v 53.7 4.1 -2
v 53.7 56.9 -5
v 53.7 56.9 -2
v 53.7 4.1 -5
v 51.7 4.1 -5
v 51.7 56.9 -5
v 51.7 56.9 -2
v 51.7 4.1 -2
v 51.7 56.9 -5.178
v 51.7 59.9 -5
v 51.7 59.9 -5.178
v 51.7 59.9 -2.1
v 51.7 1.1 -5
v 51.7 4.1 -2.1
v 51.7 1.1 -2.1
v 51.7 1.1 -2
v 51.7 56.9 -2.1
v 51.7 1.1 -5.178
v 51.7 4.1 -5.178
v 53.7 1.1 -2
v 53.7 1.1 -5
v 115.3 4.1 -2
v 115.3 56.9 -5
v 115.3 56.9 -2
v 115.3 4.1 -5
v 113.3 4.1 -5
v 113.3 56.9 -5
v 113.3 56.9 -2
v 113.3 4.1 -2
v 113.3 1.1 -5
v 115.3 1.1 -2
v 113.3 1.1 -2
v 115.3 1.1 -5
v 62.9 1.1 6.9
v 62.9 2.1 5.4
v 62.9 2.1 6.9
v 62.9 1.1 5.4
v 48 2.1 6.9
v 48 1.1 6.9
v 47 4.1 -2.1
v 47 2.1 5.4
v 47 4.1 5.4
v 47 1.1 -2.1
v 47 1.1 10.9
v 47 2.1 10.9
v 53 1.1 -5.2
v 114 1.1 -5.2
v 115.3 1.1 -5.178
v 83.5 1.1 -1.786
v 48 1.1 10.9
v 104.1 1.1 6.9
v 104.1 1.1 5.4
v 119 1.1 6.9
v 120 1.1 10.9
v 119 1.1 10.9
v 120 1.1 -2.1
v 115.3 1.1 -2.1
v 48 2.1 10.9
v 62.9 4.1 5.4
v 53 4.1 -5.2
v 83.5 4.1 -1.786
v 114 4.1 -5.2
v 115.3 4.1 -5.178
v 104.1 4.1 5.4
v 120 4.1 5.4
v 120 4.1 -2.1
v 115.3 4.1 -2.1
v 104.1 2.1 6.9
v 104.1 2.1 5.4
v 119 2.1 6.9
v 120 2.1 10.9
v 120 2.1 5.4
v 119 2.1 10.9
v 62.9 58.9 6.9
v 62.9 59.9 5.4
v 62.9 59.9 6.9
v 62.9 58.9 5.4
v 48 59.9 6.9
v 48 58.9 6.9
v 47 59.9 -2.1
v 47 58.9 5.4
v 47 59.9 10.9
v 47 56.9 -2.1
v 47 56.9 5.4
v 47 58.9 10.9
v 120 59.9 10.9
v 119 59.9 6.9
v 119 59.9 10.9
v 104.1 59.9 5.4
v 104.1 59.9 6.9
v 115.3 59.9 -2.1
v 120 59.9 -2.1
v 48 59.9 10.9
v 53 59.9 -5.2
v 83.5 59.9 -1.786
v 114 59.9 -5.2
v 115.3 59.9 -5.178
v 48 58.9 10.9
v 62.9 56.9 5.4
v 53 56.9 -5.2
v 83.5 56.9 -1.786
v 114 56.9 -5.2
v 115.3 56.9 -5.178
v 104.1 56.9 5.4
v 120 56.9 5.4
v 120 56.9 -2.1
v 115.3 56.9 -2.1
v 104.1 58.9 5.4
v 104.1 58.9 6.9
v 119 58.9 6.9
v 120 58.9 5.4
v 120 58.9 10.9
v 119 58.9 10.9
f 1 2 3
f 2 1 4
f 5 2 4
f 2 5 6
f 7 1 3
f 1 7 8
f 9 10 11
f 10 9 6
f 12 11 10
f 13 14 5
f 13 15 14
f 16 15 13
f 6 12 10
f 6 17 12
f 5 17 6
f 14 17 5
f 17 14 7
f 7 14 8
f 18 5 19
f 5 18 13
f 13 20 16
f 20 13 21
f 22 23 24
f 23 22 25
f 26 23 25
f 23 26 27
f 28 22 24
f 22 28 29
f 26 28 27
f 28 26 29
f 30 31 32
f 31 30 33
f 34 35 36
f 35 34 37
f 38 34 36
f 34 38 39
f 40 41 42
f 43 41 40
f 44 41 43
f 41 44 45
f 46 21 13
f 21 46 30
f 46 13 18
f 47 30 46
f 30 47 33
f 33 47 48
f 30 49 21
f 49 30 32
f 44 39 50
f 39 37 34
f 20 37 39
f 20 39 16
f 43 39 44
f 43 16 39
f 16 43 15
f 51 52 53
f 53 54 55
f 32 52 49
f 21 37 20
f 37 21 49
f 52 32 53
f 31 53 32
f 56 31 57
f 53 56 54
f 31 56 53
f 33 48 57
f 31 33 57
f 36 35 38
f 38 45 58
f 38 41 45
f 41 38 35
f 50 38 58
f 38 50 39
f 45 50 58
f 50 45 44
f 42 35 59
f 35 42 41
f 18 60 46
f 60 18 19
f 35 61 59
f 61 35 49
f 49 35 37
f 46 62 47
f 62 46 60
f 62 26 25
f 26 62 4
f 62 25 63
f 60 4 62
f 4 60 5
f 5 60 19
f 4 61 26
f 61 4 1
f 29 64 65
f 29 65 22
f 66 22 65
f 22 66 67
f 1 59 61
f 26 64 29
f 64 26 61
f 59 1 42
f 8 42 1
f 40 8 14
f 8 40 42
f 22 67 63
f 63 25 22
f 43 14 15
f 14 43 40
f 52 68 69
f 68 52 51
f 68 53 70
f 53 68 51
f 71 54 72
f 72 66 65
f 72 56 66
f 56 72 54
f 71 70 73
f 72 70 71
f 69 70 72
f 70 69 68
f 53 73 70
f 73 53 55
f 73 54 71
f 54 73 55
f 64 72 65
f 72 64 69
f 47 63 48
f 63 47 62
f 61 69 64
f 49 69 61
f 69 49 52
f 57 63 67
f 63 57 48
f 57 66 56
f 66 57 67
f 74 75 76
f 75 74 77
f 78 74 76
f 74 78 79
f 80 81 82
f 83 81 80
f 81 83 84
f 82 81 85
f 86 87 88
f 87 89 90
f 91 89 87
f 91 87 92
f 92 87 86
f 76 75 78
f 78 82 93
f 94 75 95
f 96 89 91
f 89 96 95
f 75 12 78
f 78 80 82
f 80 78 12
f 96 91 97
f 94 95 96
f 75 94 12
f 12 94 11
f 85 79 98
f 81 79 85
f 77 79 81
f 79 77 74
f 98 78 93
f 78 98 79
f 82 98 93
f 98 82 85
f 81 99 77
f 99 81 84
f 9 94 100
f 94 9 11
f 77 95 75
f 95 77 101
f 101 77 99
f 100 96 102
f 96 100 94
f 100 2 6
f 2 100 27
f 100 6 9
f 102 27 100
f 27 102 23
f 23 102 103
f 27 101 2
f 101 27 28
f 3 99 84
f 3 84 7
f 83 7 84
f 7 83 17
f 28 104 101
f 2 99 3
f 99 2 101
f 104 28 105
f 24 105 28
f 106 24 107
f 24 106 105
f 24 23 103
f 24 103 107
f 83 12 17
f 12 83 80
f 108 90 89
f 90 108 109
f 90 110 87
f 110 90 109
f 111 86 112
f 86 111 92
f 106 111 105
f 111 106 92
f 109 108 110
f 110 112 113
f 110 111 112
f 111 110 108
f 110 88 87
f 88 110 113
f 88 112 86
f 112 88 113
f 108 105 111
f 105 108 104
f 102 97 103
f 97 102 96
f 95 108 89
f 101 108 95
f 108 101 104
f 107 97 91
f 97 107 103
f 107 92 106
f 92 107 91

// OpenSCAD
ALLOWANCE = .1;
WALL = 1; // Wall thickness.
W = 167 - WALL * 2; // Back panel width.
H = 61 - WALL * 2; // Back panel height.
T = 12; // Case thickness without battery.
WFLAT = 32; // Width of the flat surface on the side.
WBEND = 22.393; // Width of the bend in the SVG file.
TBEND = 6; // Height of the bend in the SVG file.
WLOGO = 56.723;
HLOGO = 8.666;
TLOGO = 0.4; // How deep the logo should be etched.
RB = 4.5 - WALL - ALLOWANCE; // Radius of the bottom corners.
RT = 23.5 - WALL - ALLOWANCE; // Radius of the top corners.
RSCREW = 3 / 2; // Radius of the screw holes.
MBSCREW = 4.5; // Margin of the bottom screw holes.
MTSCREW = 12.5; // Margin of the bottom screw holes.
HCOL = 5.5;

WCONN = 2;
TCONN = 3;
MCONN = 4.7;

WMID = W - (WFLAT + WBEND) * 2; // Width of the middle panel.
WSCR = 73;

module lucy_locks() {
  translate([1, 1, 1])
    mirror([0, 0, 1]) {
      color("blue") {
        translate([(W - WSCR) / 2 + MCONN, ALLOWANCE, TBEND - TCONN])
          cube([WCONN, H - ALLOWANCE * 2, TCONN]);
        translate([W - (W - WSCR) / 2 - WCONN - MCONN, ALLOWANCE, TBEND - TCONN])
          cube([WCONN, H - ALLOWANCE * 2, TCONN]);
      }
      color("cyan") {
        translate([(W - WSCR) / 2, 1 + ALLOWANCE, -5.9])
          mirror([0, 1, 0])
            lucy_lock();
        translate([(W + WSCR) / 2, 1 + ALLOWANCE, -5.9])
          mirror([0, 1, 0])
            mirror([1, 0, 0])
              lucy_lock();
        translate([0, H - 1, 0]) {
          translate([(W - WSCR) / 2, -ALLOWANCE, -5.9])
            lucy_lock();
          translate([(W + WSCR) / 2, -ALLOWANCE, -5.9])
            mirror([1, 0, 0])
              lucy_lock();
        }
      }
    }
}

module lucy_lock() {
  difference() {
    union() {
      cube([15.9, 1, 10]);
      translate([0, 0, -4])
        cube([1, 1, 9]);
      hull() {
        translate([0, -2, 1.5])
          cube([15.9, 3, 10.5]);
        translate([6, -2, 12])
          cube([40, 3, .1]);
      }
    }
    translate([-1, -3, 9])
      cube([5.7, 5, 10]);
  }
}

lucy_locks();
